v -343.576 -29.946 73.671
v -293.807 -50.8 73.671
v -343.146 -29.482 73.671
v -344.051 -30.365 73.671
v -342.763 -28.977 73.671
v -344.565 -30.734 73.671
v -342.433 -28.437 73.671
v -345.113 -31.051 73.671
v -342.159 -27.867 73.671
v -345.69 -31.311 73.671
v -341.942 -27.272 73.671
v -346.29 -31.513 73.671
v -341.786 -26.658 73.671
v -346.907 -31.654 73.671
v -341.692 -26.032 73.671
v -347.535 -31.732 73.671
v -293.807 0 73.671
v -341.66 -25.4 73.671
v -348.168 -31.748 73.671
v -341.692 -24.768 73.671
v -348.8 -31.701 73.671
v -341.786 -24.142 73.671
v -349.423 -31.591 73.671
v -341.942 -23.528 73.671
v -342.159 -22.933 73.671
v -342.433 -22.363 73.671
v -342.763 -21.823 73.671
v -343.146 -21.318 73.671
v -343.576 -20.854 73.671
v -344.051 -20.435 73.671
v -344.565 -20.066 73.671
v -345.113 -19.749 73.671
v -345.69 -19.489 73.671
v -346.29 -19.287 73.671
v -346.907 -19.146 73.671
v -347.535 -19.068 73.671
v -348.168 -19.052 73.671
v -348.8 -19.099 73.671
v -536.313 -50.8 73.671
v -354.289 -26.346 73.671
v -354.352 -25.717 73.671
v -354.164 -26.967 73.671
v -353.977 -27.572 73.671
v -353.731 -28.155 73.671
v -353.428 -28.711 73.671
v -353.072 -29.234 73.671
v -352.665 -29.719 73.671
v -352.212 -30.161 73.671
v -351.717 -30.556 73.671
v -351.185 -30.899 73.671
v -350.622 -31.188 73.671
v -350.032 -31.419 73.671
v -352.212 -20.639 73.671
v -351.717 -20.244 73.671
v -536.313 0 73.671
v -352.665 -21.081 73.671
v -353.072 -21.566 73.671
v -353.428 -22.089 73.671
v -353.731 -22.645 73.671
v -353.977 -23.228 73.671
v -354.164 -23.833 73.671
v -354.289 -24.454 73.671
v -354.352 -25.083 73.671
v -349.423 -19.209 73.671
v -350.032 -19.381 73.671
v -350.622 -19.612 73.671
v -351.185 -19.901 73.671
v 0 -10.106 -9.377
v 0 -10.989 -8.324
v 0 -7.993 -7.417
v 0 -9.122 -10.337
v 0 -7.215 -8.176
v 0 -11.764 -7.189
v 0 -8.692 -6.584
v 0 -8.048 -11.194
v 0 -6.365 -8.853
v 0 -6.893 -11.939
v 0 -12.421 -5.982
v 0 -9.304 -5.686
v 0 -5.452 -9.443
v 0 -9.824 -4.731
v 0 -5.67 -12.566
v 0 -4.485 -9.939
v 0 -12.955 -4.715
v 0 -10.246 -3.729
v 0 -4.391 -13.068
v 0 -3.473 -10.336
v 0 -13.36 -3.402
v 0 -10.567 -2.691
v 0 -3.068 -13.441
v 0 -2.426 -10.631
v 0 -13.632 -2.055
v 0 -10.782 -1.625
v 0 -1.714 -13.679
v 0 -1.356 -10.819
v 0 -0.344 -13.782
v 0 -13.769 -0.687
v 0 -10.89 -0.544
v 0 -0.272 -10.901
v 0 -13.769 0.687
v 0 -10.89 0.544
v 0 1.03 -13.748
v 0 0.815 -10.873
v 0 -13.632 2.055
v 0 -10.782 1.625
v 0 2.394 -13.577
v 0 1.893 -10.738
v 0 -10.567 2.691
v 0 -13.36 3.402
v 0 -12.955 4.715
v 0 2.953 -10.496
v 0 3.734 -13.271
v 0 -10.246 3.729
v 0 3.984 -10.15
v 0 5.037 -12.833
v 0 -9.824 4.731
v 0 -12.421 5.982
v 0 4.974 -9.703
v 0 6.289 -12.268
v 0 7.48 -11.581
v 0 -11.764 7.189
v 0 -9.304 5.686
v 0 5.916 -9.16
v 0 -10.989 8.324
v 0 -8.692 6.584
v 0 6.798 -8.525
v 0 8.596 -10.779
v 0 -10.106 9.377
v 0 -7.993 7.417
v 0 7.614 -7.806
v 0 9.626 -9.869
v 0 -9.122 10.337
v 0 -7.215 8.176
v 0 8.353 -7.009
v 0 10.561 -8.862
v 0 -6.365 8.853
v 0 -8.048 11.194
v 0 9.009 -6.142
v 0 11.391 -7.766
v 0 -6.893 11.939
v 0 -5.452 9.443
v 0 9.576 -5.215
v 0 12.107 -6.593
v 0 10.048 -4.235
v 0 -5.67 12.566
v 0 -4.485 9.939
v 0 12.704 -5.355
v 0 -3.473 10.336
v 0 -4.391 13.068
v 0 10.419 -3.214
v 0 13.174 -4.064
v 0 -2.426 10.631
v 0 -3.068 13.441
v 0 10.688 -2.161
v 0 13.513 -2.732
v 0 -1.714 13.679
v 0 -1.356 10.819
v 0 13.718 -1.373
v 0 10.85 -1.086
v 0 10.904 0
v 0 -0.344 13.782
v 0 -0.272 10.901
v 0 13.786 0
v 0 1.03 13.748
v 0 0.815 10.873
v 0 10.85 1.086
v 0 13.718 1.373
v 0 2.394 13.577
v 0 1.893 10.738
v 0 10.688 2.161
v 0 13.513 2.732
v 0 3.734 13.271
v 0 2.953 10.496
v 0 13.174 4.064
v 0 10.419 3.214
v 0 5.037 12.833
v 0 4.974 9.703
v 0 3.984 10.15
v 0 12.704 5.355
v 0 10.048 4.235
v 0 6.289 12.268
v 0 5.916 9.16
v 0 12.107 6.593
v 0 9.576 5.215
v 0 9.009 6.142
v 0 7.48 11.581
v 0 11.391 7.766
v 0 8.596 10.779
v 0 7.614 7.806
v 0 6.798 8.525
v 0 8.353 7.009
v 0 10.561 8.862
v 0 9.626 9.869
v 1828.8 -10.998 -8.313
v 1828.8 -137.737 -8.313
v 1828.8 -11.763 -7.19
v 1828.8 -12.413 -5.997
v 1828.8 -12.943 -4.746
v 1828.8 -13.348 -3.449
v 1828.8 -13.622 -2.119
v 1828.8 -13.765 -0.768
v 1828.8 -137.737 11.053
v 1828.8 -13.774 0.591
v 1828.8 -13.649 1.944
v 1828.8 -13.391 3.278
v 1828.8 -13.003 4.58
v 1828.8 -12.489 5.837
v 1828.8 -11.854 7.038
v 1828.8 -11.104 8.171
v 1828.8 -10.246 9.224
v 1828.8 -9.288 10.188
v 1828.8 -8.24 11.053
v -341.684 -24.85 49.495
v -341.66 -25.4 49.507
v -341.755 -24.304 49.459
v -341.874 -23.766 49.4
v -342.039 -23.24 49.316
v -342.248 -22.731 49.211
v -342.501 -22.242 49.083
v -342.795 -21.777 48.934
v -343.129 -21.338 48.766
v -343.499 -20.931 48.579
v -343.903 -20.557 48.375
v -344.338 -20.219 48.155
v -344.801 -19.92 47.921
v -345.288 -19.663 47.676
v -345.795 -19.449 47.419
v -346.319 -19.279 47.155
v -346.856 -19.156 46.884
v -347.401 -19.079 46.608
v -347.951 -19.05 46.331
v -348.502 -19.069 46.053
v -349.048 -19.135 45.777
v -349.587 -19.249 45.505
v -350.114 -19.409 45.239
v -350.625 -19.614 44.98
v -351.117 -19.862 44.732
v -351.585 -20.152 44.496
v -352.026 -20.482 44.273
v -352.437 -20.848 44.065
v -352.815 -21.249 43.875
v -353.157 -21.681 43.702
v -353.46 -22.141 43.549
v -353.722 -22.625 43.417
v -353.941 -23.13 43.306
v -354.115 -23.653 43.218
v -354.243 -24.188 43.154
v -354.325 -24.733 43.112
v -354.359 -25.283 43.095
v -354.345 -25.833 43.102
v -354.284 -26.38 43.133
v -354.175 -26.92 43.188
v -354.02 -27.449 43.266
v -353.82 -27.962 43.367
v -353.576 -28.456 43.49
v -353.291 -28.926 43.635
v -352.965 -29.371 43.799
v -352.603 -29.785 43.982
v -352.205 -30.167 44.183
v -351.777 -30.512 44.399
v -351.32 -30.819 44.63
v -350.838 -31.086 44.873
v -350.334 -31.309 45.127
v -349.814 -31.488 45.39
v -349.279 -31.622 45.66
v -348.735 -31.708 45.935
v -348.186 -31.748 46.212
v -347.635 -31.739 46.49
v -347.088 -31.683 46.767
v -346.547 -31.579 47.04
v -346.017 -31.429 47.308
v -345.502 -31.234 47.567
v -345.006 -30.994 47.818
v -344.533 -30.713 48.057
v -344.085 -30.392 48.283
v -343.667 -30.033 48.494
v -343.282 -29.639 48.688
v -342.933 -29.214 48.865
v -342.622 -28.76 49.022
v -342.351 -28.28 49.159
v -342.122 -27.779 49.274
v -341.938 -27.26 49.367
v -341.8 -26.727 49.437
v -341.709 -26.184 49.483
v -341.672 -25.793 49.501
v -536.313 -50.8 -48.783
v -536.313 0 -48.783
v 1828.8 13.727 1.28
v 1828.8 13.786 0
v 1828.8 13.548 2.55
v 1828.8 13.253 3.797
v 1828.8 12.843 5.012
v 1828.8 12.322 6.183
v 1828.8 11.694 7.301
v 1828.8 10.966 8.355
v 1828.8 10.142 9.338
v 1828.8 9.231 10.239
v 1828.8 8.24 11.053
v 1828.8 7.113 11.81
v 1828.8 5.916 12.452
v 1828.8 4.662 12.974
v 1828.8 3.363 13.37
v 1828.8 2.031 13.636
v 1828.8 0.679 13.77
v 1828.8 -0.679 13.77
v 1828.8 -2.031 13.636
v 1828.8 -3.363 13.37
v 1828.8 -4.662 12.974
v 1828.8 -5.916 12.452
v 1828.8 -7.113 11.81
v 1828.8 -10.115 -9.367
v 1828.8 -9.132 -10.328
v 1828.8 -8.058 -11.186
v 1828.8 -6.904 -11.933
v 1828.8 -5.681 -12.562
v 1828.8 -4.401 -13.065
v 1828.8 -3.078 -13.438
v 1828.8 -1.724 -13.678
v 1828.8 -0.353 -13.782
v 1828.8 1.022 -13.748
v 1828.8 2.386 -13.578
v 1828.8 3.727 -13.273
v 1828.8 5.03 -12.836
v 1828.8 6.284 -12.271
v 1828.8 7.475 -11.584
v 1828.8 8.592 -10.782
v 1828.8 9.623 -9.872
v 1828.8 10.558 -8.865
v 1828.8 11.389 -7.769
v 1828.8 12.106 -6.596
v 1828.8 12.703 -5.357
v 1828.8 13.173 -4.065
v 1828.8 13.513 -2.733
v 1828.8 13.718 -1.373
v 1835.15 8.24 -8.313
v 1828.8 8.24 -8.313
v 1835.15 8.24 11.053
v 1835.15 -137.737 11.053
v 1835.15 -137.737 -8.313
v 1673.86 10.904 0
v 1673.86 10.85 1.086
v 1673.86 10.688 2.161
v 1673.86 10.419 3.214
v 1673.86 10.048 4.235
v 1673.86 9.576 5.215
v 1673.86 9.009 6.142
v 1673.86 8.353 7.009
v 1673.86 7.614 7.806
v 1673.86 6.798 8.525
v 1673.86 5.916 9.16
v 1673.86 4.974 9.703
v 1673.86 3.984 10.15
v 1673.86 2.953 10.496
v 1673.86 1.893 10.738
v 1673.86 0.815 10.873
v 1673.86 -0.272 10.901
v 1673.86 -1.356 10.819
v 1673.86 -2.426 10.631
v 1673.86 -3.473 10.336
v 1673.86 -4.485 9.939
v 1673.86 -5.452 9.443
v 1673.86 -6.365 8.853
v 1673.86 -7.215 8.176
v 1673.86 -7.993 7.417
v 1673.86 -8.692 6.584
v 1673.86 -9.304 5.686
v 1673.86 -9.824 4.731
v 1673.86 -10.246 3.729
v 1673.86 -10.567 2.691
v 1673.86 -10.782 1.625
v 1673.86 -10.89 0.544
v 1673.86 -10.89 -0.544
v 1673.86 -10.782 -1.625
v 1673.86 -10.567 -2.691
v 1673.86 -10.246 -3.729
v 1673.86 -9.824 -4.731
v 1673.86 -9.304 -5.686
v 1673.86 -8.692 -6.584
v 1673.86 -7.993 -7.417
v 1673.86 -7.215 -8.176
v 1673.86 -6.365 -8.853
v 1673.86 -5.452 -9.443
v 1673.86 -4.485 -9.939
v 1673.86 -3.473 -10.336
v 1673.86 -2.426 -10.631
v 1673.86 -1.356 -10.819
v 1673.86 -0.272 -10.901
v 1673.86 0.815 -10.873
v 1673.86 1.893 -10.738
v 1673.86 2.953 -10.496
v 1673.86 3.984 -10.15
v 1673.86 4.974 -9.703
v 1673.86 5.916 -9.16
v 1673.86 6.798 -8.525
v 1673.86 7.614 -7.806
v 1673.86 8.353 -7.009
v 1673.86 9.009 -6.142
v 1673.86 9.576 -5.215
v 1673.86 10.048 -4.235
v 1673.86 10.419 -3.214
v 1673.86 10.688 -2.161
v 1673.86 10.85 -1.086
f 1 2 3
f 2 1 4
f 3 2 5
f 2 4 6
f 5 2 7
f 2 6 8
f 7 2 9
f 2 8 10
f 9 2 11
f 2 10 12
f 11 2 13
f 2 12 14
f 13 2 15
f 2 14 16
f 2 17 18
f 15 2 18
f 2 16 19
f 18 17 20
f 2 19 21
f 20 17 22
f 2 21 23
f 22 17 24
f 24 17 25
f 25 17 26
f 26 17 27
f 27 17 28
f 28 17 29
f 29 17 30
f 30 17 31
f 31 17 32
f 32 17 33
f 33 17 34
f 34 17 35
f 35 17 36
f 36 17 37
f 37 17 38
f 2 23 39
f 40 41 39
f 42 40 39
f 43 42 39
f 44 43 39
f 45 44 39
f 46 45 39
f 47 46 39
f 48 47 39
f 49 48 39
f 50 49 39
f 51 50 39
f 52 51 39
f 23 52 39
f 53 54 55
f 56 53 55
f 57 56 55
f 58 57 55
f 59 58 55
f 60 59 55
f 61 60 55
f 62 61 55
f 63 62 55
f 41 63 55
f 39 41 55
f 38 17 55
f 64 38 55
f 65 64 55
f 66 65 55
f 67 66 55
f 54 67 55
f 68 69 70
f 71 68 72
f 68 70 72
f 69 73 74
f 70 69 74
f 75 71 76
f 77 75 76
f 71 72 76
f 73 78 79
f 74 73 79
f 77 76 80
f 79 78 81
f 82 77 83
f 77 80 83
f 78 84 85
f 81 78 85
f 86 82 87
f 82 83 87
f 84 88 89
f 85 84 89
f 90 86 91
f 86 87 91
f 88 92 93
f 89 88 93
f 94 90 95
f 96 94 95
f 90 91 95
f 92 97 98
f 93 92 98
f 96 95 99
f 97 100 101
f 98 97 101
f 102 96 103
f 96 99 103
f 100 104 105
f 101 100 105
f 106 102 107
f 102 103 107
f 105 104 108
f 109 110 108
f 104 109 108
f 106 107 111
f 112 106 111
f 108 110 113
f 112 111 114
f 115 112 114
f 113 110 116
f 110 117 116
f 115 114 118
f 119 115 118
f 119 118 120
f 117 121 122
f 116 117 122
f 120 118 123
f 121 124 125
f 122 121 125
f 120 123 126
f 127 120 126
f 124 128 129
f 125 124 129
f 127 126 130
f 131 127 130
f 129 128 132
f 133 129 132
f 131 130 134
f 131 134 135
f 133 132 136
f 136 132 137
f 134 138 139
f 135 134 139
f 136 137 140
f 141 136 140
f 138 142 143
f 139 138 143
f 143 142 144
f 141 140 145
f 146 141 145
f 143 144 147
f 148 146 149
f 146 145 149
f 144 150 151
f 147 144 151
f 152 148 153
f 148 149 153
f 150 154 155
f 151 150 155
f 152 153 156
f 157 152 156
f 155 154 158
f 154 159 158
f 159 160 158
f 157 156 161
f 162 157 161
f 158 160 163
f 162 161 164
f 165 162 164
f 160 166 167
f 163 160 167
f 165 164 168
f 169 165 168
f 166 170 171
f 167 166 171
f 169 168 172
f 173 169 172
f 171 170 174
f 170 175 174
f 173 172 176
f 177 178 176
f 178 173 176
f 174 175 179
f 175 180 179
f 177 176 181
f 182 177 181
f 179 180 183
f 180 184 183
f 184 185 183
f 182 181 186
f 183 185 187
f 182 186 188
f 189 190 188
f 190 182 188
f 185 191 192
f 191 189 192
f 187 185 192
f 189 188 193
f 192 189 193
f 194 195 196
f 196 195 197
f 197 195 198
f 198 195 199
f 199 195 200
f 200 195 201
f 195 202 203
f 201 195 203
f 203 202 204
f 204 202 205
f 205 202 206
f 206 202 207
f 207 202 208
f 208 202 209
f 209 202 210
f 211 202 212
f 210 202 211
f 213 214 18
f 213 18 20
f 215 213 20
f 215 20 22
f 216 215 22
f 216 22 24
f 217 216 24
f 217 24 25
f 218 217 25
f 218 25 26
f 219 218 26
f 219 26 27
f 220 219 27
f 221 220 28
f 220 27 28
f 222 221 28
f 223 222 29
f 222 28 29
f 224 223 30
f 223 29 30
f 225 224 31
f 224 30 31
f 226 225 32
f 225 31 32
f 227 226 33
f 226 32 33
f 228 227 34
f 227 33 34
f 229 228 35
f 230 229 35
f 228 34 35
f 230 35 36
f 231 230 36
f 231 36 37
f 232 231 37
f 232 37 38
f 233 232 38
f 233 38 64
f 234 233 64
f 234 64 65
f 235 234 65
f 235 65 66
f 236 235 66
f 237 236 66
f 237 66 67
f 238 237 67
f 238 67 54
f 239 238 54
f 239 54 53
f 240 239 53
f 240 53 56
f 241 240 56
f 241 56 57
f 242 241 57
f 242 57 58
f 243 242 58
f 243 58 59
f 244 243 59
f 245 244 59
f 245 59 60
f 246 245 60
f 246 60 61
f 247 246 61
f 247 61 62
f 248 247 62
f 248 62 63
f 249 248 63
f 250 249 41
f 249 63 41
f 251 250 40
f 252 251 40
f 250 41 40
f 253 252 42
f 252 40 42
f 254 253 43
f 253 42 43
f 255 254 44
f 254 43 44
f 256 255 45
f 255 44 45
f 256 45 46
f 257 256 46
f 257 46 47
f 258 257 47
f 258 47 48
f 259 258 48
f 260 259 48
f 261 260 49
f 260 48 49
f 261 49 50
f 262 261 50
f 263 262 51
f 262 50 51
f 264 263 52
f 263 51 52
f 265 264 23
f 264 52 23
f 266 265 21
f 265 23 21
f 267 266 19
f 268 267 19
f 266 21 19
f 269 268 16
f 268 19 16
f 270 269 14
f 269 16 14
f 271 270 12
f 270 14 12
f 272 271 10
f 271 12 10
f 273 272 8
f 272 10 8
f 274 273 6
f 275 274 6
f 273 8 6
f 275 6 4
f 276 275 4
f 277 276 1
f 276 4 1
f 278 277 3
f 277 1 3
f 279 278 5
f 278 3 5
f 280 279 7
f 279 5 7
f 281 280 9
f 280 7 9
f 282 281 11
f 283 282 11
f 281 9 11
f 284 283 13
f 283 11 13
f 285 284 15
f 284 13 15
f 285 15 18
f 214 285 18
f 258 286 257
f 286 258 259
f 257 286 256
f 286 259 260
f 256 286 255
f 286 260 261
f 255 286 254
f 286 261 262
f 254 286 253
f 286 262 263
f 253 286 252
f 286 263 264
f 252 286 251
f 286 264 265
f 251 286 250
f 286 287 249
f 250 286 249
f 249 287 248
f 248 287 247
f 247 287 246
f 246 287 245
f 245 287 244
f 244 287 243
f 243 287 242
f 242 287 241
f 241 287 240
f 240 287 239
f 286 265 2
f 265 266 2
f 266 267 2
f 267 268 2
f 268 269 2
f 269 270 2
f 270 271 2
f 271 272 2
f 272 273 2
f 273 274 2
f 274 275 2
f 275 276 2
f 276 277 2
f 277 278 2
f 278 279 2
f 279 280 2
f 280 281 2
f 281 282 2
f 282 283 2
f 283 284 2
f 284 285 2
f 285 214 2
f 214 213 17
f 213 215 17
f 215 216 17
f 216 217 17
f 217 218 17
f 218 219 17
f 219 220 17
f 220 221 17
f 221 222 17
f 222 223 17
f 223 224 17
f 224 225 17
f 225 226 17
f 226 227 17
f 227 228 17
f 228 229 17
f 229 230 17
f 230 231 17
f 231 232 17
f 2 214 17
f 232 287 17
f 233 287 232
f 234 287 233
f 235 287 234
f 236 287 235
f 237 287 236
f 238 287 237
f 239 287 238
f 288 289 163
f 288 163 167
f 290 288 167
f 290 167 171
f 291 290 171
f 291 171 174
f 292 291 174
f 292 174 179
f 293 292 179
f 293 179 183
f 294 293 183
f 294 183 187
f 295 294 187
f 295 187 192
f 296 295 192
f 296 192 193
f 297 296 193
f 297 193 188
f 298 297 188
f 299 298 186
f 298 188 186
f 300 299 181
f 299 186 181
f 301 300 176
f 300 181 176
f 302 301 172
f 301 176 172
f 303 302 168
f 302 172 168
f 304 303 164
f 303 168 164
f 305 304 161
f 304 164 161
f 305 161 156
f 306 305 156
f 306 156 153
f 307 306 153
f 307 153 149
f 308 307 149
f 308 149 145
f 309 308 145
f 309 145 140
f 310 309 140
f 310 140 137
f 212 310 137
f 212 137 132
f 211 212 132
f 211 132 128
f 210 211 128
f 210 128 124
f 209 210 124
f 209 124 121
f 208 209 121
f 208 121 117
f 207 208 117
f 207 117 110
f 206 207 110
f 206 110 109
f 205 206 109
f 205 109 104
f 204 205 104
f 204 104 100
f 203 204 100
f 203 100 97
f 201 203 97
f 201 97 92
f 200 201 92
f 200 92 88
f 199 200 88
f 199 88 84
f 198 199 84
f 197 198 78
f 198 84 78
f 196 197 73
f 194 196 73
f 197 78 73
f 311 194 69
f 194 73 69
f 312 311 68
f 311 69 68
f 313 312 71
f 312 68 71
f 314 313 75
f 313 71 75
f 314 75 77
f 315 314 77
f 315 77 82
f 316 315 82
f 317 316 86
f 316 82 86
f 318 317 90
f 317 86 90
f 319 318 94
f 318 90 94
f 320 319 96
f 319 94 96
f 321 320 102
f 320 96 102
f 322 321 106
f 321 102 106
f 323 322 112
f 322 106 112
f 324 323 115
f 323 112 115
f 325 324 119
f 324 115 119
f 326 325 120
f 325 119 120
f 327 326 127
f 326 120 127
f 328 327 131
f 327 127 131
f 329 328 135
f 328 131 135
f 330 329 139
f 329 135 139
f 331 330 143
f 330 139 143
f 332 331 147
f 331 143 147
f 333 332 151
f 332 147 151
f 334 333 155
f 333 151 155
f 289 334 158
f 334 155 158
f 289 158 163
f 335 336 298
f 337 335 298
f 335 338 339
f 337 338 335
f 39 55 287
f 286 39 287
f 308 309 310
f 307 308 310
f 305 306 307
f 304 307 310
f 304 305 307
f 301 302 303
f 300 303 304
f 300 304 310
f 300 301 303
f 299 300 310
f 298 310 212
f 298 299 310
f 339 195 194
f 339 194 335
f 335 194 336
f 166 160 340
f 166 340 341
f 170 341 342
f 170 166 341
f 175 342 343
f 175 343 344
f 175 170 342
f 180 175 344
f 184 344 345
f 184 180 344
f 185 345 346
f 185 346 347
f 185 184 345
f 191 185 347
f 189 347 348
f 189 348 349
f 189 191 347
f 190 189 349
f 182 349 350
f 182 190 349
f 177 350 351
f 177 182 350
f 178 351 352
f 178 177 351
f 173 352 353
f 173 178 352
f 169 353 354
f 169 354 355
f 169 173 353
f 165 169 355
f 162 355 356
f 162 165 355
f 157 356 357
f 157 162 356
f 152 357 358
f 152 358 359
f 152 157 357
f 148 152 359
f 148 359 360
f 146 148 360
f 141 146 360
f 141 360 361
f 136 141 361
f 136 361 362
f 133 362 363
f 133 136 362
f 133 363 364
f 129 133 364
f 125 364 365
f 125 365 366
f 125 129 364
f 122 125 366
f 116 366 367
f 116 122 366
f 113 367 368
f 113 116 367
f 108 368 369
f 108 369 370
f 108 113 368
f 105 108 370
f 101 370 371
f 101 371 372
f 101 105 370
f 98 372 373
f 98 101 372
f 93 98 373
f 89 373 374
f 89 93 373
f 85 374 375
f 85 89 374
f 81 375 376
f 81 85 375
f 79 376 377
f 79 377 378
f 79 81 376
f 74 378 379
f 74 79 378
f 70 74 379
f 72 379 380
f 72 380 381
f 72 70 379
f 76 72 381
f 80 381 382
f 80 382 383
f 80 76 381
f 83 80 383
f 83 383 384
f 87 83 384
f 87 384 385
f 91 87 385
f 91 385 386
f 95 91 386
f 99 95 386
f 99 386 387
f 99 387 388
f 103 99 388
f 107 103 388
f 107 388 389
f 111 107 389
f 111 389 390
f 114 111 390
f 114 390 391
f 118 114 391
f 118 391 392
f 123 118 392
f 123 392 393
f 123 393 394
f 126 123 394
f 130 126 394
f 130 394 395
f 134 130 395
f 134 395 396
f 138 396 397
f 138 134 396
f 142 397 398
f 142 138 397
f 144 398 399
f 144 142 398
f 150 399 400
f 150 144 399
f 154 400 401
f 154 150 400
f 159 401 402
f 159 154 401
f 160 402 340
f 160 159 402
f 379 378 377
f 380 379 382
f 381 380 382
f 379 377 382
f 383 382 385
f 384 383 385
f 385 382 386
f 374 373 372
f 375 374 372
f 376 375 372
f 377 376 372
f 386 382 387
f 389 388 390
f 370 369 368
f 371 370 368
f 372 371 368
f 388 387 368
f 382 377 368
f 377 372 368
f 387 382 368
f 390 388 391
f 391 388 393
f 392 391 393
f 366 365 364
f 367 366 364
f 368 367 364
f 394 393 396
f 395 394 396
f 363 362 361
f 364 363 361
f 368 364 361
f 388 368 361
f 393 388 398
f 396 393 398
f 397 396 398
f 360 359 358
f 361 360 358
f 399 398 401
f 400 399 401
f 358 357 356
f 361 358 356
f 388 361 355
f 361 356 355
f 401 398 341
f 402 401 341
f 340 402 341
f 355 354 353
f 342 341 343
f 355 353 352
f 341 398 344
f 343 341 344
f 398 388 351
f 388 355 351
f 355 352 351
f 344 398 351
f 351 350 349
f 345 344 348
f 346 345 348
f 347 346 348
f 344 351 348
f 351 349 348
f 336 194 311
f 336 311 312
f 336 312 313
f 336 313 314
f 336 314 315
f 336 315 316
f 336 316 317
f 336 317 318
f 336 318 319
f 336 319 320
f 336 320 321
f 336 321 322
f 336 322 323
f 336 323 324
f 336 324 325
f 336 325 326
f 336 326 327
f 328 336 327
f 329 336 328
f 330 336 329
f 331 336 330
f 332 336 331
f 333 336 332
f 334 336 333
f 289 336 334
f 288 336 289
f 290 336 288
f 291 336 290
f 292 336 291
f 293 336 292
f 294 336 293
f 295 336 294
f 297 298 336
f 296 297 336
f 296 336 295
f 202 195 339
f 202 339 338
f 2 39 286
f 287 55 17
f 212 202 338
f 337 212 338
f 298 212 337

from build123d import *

# Parameters (mm, degrees)
F0_R     = 13.786244
F1_DEPTH = 1828.8
F2_R     = 10.903901
F3_DEPTH = 1673.86
F4_W     = 145.977509
F4_H     = 19.365289
F5_DEPTH = 6.35
F7_DEPTH = 50.8
F8_R     = 6.35
F9_DEPTH = 38.1


with BuildPart() as f1:
    # F0 (on Right) → F1 (new body)
    with BuildSketch(Plane.YZ):
        Circle(F0_R)
    extrude(amount=F1_DEPTH)

    # F2 (on Right) → F3 (cut)
    with BuildSketch(Plane.YZ):
        Circle(F2_R)
    extrude(amount=F3_DEPTH, mode=Mode.SUBTRACT)

    # F4 (on face) → F5 (join)
    with BuildSketch(Plane.YZ.offset(1828.8)):
        with Locations((-64.748525, 1.369918)):
            Rectangle(F4_W, F4_H)
    extrude(amount=F5_DEPTH)


with BuildPart() as f7:
    # F6 (on Front) → F7 (new body)
    with BuildSketch(Plane.XZ):
        Polygon((-293.807387, 73.670708), (-536.313117, 73.670708), (-536.313117, -48.78268), align=None)
    extrude(amount=F7_DEPTH)

    # F8 (on face) → F9 (cut)
    with BuildSketch(Plane.XY.offset(73.670708)):
        with Locations((-348.010033, -25.4)):
            Circle(F8_R)
    extrude(amount=-F9_DEPTH, mode=Mode.SUBTRACT)


solid = Compound([f1.part, f7.part])
